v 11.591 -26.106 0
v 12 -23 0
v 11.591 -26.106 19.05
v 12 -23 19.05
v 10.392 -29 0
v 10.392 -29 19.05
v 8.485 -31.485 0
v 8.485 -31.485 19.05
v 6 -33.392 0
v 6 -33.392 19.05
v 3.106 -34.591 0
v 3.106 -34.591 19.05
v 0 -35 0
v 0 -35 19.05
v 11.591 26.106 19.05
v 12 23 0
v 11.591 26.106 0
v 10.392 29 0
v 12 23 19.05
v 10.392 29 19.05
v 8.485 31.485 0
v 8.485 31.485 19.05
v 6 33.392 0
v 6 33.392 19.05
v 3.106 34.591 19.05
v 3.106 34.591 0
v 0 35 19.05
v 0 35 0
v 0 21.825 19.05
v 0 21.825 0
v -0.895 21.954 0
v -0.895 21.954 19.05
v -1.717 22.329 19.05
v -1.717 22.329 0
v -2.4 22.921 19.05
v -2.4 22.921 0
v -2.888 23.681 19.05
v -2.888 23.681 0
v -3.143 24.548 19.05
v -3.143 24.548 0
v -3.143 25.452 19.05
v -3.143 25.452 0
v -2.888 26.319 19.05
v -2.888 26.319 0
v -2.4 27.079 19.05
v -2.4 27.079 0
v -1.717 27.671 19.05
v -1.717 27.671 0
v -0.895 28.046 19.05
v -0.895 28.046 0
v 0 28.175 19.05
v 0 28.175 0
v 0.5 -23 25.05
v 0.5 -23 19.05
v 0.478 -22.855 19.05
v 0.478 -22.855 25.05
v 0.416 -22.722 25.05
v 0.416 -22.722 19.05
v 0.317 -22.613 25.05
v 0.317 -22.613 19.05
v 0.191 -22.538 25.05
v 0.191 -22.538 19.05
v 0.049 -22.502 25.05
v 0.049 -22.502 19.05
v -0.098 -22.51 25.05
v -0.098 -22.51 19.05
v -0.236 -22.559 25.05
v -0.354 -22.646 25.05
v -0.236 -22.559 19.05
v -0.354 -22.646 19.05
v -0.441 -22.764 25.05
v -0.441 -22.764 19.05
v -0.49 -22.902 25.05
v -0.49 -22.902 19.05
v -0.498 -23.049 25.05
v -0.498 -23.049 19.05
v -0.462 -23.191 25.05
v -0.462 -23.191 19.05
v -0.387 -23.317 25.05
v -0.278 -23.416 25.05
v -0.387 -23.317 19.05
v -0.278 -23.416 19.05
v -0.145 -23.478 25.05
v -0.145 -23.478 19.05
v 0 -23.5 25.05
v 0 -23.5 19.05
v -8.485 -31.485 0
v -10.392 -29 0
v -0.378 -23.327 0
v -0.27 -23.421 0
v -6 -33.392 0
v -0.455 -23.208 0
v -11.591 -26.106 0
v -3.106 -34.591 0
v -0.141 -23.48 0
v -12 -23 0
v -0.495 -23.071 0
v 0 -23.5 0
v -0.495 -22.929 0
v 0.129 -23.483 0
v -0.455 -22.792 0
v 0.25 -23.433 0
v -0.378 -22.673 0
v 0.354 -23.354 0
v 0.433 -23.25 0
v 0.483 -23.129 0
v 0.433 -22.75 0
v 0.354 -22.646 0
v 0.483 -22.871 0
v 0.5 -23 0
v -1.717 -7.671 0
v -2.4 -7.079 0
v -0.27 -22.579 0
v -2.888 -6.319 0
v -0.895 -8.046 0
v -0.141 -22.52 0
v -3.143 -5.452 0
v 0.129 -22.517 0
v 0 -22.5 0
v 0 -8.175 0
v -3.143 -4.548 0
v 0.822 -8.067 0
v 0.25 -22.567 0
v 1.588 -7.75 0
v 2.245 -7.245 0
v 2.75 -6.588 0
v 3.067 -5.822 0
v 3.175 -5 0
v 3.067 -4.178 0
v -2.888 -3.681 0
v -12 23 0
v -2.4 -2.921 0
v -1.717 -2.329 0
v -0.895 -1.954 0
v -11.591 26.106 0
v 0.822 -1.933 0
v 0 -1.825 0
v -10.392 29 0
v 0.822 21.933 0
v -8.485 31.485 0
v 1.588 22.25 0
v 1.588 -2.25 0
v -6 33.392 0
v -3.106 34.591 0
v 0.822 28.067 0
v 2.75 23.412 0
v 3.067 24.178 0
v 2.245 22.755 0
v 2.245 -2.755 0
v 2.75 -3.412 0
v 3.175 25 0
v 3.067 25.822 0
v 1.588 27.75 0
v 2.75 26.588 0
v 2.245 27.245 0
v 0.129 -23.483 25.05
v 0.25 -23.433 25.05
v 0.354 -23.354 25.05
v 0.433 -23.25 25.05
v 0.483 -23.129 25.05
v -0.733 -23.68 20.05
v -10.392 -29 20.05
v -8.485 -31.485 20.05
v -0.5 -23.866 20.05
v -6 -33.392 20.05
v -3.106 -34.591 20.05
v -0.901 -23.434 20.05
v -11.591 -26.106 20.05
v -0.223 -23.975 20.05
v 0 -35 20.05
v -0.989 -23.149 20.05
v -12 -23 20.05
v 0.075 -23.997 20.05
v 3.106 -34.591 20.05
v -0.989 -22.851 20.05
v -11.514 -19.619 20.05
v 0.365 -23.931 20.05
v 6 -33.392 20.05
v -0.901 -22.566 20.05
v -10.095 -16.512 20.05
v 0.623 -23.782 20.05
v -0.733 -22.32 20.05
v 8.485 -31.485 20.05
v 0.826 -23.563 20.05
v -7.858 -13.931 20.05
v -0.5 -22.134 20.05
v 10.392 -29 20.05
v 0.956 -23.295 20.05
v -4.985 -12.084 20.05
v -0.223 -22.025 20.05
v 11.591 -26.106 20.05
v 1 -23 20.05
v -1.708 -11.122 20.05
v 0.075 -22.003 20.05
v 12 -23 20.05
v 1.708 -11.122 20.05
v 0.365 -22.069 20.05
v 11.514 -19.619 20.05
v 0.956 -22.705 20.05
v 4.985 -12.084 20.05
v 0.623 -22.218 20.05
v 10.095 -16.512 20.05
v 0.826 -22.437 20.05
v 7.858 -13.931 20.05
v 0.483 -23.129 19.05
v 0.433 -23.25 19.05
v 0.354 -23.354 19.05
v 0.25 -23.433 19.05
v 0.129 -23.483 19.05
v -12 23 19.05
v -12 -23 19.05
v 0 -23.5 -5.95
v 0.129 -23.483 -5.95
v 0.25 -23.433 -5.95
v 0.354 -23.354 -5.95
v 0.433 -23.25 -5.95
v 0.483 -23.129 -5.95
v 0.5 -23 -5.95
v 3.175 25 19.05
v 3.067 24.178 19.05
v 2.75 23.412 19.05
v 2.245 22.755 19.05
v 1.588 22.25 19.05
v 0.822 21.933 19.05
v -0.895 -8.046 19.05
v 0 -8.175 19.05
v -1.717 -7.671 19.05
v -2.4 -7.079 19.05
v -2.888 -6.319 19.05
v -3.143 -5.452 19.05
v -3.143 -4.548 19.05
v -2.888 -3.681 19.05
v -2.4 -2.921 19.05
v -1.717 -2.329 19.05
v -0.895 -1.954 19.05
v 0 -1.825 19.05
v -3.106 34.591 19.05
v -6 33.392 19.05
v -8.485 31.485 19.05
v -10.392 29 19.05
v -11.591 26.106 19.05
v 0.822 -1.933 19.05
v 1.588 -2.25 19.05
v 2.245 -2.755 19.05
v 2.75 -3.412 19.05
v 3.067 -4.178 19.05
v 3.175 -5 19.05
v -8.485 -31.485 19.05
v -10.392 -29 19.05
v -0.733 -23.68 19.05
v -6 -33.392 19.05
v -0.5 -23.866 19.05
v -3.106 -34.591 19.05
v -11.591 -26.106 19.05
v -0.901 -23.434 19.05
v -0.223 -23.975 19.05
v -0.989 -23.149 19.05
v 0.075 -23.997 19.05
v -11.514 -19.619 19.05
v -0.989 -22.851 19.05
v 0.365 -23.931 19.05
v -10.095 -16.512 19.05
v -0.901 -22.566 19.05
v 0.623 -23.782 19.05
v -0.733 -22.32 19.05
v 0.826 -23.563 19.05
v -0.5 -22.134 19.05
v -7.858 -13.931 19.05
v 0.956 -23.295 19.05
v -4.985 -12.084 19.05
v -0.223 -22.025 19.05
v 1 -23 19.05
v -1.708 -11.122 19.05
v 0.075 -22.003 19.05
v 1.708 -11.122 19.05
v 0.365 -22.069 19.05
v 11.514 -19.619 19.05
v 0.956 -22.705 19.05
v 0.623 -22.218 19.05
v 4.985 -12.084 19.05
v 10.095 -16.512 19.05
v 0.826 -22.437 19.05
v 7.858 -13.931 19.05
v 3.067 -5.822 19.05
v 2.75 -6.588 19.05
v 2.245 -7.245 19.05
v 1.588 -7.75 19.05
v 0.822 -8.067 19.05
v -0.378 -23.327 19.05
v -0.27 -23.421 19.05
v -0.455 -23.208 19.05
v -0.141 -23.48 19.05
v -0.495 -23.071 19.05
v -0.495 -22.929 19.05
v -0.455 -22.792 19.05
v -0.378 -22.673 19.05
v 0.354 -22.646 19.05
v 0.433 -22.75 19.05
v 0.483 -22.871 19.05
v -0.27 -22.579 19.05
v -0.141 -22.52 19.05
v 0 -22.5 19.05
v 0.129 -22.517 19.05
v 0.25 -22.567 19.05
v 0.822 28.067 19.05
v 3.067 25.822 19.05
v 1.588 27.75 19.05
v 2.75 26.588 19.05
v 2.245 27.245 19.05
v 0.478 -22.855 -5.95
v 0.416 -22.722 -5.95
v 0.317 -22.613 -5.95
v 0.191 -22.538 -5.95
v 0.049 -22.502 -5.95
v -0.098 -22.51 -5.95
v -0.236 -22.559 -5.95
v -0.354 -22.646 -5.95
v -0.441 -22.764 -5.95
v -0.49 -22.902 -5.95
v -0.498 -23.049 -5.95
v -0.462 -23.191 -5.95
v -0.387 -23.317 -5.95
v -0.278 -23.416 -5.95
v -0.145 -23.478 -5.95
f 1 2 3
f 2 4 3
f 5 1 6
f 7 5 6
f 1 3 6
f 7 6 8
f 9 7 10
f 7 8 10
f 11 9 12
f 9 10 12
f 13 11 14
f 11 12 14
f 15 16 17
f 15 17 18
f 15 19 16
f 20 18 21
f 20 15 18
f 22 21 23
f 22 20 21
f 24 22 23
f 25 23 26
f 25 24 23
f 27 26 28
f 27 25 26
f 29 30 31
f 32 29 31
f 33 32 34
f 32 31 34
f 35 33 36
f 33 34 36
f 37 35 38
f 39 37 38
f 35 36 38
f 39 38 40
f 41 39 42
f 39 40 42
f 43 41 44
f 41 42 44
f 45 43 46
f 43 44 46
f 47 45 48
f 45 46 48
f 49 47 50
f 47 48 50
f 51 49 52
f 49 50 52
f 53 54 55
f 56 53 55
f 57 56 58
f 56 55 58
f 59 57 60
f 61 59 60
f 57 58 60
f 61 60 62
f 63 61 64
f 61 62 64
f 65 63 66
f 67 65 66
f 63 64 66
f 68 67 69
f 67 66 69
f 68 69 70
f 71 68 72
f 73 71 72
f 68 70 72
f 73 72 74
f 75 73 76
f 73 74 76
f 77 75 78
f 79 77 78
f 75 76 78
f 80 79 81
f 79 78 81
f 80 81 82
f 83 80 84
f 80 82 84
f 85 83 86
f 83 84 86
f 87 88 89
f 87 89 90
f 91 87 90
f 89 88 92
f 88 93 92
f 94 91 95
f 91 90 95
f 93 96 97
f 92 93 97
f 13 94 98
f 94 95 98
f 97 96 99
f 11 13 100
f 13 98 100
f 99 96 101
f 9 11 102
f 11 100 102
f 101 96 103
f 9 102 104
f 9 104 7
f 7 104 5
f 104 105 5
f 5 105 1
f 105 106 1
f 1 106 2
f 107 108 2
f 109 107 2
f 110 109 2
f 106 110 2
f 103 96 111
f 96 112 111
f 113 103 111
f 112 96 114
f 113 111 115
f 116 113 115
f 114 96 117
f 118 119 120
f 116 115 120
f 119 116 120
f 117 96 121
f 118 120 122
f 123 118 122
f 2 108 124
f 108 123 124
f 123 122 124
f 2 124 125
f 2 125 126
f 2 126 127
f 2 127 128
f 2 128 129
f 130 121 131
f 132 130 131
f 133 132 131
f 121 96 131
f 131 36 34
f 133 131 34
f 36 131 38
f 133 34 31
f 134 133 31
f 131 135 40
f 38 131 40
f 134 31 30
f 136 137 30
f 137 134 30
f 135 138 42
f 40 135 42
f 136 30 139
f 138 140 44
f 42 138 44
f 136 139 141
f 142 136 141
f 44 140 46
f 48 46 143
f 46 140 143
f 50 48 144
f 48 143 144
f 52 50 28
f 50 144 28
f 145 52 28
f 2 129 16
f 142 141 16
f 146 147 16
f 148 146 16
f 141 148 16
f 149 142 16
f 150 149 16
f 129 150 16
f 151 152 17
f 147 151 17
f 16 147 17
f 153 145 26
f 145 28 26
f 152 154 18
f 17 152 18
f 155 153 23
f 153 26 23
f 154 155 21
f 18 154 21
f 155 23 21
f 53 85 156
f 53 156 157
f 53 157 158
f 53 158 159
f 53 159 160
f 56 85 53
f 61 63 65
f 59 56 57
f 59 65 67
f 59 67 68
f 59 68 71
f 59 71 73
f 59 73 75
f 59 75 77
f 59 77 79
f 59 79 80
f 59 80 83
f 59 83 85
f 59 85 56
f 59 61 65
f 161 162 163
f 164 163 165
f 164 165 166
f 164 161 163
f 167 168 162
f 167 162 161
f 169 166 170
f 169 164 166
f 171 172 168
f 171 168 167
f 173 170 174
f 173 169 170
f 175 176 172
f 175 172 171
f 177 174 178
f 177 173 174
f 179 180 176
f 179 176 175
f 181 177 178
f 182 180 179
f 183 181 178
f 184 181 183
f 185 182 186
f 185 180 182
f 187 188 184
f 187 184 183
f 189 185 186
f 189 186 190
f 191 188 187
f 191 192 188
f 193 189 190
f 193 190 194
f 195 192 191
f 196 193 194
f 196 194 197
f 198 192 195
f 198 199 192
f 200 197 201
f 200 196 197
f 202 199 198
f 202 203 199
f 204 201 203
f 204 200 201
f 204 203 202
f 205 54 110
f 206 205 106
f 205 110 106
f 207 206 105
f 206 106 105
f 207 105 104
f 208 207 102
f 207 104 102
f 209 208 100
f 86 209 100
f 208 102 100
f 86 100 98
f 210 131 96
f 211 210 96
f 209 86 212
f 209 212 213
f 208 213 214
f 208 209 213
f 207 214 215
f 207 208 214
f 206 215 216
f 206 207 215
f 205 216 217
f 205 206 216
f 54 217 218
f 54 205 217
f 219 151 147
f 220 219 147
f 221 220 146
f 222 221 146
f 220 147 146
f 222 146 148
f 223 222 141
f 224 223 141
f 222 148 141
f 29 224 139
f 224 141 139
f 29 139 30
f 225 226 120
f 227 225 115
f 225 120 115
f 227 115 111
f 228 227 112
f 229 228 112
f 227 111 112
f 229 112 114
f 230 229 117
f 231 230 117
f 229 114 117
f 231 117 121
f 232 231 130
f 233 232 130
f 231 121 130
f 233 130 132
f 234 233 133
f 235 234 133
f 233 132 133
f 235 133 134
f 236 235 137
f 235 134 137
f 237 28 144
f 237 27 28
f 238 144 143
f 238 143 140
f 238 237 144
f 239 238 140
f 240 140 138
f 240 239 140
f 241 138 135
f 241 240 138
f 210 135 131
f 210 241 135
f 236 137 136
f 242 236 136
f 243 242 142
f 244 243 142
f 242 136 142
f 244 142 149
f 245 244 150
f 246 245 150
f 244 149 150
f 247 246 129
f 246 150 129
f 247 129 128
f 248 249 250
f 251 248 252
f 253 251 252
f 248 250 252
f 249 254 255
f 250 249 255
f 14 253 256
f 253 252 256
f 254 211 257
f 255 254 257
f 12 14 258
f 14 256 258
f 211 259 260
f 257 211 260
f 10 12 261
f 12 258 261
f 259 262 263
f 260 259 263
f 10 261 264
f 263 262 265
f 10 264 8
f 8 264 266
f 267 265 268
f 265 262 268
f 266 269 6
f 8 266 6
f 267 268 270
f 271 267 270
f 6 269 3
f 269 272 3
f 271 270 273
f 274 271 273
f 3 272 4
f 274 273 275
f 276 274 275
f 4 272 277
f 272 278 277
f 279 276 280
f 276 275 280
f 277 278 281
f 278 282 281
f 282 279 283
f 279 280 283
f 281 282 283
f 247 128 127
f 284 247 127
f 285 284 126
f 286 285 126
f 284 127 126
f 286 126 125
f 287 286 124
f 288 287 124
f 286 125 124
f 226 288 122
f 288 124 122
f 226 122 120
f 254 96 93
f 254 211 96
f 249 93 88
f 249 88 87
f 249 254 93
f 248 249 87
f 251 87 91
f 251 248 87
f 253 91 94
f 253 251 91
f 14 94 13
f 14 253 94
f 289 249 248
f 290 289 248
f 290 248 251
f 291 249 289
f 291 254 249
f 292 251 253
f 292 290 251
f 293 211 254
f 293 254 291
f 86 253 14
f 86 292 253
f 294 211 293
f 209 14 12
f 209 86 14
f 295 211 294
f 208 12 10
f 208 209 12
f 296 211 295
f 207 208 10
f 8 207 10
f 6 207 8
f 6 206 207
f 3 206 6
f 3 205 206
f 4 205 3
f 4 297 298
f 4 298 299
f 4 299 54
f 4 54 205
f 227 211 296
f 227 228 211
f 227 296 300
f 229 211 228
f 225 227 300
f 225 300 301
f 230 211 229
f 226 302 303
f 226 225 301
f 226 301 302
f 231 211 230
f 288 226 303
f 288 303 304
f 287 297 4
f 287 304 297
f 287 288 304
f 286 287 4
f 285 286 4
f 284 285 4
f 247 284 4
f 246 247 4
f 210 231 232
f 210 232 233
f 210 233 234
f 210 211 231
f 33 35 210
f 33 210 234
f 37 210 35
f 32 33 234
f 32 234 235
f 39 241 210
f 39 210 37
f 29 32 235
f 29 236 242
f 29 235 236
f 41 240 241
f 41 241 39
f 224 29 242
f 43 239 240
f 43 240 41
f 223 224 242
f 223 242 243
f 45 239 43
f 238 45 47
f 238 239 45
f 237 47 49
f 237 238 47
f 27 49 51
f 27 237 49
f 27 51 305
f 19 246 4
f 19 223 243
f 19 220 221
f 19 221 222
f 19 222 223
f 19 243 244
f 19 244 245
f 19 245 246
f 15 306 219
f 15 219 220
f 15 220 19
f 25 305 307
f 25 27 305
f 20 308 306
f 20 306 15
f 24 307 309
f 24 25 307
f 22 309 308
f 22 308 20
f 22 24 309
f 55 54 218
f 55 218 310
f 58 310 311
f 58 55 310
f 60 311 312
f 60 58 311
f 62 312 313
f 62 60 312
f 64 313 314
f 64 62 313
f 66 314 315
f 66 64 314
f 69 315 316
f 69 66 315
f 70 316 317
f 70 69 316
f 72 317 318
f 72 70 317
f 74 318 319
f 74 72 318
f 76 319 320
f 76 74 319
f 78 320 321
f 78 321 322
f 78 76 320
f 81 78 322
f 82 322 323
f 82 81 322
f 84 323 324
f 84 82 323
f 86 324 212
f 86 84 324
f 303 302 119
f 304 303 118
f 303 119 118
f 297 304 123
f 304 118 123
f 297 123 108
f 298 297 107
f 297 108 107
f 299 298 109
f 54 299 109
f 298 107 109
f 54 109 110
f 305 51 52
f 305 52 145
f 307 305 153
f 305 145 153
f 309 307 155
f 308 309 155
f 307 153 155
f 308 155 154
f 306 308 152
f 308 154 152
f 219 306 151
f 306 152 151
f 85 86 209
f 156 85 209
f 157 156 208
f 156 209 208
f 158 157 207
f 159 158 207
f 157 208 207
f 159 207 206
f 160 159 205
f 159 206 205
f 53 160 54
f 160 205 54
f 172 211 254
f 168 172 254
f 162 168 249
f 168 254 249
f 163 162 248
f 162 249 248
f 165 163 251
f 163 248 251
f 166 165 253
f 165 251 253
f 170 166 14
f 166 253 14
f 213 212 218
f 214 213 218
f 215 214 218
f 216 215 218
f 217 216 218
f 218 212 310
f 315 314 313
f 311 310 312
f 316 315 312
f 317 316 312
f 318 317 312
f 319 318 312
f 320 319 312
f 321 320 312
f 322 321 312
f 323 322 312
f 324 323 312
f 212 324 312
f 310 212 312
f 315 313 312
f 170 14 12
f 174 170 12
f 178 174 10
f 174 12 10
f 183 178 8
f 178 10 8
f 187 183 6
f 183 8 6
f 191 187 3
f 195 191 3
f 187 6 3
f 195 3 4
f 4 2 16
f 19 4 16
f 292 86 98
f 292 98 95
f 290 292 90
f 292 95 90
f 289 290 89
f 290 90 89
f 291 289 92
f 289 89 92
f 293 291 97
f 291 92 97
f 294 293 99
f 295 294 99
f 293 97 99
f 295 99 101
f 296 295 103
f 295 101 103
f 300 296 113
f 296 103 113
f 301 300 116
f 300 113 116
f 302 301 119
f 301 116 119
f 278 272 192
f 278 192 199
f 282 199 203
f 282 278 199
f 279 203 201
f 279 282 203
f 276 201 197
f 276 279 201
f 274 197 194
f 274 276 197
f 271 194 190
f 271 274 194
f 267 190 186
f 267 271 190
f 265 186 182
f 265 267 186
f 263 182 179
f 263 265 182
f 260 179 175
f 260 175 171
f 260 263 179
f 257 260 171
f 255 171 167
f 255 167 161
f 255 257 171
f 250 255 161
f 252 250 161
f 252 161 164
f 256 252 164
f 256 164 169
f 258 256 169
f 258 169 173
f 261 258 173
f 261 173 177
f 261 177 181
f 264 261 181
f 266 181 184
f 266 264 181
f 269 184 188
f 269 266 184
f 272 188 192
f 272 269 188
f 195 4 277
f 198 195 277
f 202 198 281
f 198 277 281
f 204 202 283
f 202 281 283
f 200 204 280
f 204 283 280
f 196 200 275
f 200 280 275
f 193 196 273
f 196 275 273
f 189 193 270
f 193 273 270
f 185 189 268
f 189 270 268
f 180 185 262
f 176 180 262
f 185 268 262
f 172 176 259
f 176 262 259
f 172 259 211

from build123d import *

# Parameters (mm, degrees)
F1_DEPTH      = 19.05
F2_R          = 1
F3_DEPTH      = 1
F5_DEPTH      = 6
F5_DEPTH_BACK = 25
F6_R          = 11.99999


# Not quite as in the source:
# - a fillet or chamfer is up to 0.001 mm smaller than in the source, because OpenCascade refuses the exact size


with BuildPart() as f1:
    # F0 (on Top) → F1 (new body)
    with BuildSketch(Plane.XY):
        with BuildLine():
            Line((12, -35), (12, 35))
            Line((12, 35), (0, 35))
            Line((0, 35), (0, 28.175))
            ThreePointArc((0, 28.175), (2.2450640303, 27.2450640303), (3.175, 25))
            ThreePointArc((3.175, 25), (2.2450640303, 22.7549359697), (0, 21.825))
            Line((0, 21.825), (0, -1.825))
            ThreePointArc((0, -1.825), (2.2450640303, -2.7549359697), (3.175, -5))
            ThreePointArc((3.175, -5), (2.2450640303, -7.2450640303), (0, -8.175))
            Line((0, -8.175), (0, -22.5))
            ThreePointArc((0, -22.5), (0.3535533906, -22.6464466094), (0.5, -23))
            ThreePointArc((0.5, -23), (0.3535533906, -23.3535533906), (0, -23.5))
            Line((0, -23.5), (0, -35))
            Line((0, -35), (12, -35))
        make_face()
        with BuildLine():
            Line((0, 28.175), (0, 35))
            Line((0, 35), (-12, 35))
            Line((-12, 35), (-12, -35))
            Line((-12, -35), (0, -35))
            Line((0, -35), (0, -23.5))
            ThreePointArc((0, -23.5), (-0.5, -23), (0, -22.5))
            Line((0, -22.5), (0, -8.175))
            ThreePointArc((0, -8.175), (-3.175, -5), (0, -1.825))
            Line((0, -1.825), (0, 21.825))
            ThreePointArc((0, 21.825), (-3.175, 25), (0, 28.175))
        make_face()
    extrude(amount=F1_DEPTH)

    # F6 (radius 12 in the source; OpenCascade refuses exactly that, so slightly less here)
    f6_edges = [f1.edges().sort_by_distance(p)[0] for p in [
        (-12, 35, 9.525),
        (12, 35, 9.525),
        (12, -35, 9.525),
        (-12, -35, 9.525),
    ]]
    fillet(f6_edges, radius=F6_R)


with BuildPart() as f3:
    # F2 (on face) → F3 (new body)
    with BuildSketch(Plane.XY.offset(19.05)):
        with BuildLine():
            ThreePointArc((0, -35), (8.4852813742, -31.4852813742), (12, -23))
            ThreePointArc((12, -23), (-5.29e-08, -11), (-12, -23.0000001058))
            ThreePointArc((-12, -23.0000001058), (-8.4852813368, -31.4852814116), (0, -35))
        make_face()
        with Locations((0, -23)):
            Circle(F2_R, mode=Mode.SUBTRACT)
    extrude(amount=F3_DEPTH)


with BuildPart() as f5:
    # F4 (on face) → F5 (new body, two sides)
    with BuildSketch(Plane.XY.offset(19.05)) as f5_sk:
        with BuildLine():
            ThreePointArc((0, -23.5), (0.3535533906, -23.3535533906), (0.5, -23))
            ThreePointArc((0.5, -23), (-0.3535533906, -22.6464466094), (0, -23.5))
        make_face()
    extrude(amount=F5_DEPTH)
    extrude(f5_sk.sketch, amount=-F5_DEPTH_BACK)


solid = Compound([f1.part, f3.part, f5.part])
